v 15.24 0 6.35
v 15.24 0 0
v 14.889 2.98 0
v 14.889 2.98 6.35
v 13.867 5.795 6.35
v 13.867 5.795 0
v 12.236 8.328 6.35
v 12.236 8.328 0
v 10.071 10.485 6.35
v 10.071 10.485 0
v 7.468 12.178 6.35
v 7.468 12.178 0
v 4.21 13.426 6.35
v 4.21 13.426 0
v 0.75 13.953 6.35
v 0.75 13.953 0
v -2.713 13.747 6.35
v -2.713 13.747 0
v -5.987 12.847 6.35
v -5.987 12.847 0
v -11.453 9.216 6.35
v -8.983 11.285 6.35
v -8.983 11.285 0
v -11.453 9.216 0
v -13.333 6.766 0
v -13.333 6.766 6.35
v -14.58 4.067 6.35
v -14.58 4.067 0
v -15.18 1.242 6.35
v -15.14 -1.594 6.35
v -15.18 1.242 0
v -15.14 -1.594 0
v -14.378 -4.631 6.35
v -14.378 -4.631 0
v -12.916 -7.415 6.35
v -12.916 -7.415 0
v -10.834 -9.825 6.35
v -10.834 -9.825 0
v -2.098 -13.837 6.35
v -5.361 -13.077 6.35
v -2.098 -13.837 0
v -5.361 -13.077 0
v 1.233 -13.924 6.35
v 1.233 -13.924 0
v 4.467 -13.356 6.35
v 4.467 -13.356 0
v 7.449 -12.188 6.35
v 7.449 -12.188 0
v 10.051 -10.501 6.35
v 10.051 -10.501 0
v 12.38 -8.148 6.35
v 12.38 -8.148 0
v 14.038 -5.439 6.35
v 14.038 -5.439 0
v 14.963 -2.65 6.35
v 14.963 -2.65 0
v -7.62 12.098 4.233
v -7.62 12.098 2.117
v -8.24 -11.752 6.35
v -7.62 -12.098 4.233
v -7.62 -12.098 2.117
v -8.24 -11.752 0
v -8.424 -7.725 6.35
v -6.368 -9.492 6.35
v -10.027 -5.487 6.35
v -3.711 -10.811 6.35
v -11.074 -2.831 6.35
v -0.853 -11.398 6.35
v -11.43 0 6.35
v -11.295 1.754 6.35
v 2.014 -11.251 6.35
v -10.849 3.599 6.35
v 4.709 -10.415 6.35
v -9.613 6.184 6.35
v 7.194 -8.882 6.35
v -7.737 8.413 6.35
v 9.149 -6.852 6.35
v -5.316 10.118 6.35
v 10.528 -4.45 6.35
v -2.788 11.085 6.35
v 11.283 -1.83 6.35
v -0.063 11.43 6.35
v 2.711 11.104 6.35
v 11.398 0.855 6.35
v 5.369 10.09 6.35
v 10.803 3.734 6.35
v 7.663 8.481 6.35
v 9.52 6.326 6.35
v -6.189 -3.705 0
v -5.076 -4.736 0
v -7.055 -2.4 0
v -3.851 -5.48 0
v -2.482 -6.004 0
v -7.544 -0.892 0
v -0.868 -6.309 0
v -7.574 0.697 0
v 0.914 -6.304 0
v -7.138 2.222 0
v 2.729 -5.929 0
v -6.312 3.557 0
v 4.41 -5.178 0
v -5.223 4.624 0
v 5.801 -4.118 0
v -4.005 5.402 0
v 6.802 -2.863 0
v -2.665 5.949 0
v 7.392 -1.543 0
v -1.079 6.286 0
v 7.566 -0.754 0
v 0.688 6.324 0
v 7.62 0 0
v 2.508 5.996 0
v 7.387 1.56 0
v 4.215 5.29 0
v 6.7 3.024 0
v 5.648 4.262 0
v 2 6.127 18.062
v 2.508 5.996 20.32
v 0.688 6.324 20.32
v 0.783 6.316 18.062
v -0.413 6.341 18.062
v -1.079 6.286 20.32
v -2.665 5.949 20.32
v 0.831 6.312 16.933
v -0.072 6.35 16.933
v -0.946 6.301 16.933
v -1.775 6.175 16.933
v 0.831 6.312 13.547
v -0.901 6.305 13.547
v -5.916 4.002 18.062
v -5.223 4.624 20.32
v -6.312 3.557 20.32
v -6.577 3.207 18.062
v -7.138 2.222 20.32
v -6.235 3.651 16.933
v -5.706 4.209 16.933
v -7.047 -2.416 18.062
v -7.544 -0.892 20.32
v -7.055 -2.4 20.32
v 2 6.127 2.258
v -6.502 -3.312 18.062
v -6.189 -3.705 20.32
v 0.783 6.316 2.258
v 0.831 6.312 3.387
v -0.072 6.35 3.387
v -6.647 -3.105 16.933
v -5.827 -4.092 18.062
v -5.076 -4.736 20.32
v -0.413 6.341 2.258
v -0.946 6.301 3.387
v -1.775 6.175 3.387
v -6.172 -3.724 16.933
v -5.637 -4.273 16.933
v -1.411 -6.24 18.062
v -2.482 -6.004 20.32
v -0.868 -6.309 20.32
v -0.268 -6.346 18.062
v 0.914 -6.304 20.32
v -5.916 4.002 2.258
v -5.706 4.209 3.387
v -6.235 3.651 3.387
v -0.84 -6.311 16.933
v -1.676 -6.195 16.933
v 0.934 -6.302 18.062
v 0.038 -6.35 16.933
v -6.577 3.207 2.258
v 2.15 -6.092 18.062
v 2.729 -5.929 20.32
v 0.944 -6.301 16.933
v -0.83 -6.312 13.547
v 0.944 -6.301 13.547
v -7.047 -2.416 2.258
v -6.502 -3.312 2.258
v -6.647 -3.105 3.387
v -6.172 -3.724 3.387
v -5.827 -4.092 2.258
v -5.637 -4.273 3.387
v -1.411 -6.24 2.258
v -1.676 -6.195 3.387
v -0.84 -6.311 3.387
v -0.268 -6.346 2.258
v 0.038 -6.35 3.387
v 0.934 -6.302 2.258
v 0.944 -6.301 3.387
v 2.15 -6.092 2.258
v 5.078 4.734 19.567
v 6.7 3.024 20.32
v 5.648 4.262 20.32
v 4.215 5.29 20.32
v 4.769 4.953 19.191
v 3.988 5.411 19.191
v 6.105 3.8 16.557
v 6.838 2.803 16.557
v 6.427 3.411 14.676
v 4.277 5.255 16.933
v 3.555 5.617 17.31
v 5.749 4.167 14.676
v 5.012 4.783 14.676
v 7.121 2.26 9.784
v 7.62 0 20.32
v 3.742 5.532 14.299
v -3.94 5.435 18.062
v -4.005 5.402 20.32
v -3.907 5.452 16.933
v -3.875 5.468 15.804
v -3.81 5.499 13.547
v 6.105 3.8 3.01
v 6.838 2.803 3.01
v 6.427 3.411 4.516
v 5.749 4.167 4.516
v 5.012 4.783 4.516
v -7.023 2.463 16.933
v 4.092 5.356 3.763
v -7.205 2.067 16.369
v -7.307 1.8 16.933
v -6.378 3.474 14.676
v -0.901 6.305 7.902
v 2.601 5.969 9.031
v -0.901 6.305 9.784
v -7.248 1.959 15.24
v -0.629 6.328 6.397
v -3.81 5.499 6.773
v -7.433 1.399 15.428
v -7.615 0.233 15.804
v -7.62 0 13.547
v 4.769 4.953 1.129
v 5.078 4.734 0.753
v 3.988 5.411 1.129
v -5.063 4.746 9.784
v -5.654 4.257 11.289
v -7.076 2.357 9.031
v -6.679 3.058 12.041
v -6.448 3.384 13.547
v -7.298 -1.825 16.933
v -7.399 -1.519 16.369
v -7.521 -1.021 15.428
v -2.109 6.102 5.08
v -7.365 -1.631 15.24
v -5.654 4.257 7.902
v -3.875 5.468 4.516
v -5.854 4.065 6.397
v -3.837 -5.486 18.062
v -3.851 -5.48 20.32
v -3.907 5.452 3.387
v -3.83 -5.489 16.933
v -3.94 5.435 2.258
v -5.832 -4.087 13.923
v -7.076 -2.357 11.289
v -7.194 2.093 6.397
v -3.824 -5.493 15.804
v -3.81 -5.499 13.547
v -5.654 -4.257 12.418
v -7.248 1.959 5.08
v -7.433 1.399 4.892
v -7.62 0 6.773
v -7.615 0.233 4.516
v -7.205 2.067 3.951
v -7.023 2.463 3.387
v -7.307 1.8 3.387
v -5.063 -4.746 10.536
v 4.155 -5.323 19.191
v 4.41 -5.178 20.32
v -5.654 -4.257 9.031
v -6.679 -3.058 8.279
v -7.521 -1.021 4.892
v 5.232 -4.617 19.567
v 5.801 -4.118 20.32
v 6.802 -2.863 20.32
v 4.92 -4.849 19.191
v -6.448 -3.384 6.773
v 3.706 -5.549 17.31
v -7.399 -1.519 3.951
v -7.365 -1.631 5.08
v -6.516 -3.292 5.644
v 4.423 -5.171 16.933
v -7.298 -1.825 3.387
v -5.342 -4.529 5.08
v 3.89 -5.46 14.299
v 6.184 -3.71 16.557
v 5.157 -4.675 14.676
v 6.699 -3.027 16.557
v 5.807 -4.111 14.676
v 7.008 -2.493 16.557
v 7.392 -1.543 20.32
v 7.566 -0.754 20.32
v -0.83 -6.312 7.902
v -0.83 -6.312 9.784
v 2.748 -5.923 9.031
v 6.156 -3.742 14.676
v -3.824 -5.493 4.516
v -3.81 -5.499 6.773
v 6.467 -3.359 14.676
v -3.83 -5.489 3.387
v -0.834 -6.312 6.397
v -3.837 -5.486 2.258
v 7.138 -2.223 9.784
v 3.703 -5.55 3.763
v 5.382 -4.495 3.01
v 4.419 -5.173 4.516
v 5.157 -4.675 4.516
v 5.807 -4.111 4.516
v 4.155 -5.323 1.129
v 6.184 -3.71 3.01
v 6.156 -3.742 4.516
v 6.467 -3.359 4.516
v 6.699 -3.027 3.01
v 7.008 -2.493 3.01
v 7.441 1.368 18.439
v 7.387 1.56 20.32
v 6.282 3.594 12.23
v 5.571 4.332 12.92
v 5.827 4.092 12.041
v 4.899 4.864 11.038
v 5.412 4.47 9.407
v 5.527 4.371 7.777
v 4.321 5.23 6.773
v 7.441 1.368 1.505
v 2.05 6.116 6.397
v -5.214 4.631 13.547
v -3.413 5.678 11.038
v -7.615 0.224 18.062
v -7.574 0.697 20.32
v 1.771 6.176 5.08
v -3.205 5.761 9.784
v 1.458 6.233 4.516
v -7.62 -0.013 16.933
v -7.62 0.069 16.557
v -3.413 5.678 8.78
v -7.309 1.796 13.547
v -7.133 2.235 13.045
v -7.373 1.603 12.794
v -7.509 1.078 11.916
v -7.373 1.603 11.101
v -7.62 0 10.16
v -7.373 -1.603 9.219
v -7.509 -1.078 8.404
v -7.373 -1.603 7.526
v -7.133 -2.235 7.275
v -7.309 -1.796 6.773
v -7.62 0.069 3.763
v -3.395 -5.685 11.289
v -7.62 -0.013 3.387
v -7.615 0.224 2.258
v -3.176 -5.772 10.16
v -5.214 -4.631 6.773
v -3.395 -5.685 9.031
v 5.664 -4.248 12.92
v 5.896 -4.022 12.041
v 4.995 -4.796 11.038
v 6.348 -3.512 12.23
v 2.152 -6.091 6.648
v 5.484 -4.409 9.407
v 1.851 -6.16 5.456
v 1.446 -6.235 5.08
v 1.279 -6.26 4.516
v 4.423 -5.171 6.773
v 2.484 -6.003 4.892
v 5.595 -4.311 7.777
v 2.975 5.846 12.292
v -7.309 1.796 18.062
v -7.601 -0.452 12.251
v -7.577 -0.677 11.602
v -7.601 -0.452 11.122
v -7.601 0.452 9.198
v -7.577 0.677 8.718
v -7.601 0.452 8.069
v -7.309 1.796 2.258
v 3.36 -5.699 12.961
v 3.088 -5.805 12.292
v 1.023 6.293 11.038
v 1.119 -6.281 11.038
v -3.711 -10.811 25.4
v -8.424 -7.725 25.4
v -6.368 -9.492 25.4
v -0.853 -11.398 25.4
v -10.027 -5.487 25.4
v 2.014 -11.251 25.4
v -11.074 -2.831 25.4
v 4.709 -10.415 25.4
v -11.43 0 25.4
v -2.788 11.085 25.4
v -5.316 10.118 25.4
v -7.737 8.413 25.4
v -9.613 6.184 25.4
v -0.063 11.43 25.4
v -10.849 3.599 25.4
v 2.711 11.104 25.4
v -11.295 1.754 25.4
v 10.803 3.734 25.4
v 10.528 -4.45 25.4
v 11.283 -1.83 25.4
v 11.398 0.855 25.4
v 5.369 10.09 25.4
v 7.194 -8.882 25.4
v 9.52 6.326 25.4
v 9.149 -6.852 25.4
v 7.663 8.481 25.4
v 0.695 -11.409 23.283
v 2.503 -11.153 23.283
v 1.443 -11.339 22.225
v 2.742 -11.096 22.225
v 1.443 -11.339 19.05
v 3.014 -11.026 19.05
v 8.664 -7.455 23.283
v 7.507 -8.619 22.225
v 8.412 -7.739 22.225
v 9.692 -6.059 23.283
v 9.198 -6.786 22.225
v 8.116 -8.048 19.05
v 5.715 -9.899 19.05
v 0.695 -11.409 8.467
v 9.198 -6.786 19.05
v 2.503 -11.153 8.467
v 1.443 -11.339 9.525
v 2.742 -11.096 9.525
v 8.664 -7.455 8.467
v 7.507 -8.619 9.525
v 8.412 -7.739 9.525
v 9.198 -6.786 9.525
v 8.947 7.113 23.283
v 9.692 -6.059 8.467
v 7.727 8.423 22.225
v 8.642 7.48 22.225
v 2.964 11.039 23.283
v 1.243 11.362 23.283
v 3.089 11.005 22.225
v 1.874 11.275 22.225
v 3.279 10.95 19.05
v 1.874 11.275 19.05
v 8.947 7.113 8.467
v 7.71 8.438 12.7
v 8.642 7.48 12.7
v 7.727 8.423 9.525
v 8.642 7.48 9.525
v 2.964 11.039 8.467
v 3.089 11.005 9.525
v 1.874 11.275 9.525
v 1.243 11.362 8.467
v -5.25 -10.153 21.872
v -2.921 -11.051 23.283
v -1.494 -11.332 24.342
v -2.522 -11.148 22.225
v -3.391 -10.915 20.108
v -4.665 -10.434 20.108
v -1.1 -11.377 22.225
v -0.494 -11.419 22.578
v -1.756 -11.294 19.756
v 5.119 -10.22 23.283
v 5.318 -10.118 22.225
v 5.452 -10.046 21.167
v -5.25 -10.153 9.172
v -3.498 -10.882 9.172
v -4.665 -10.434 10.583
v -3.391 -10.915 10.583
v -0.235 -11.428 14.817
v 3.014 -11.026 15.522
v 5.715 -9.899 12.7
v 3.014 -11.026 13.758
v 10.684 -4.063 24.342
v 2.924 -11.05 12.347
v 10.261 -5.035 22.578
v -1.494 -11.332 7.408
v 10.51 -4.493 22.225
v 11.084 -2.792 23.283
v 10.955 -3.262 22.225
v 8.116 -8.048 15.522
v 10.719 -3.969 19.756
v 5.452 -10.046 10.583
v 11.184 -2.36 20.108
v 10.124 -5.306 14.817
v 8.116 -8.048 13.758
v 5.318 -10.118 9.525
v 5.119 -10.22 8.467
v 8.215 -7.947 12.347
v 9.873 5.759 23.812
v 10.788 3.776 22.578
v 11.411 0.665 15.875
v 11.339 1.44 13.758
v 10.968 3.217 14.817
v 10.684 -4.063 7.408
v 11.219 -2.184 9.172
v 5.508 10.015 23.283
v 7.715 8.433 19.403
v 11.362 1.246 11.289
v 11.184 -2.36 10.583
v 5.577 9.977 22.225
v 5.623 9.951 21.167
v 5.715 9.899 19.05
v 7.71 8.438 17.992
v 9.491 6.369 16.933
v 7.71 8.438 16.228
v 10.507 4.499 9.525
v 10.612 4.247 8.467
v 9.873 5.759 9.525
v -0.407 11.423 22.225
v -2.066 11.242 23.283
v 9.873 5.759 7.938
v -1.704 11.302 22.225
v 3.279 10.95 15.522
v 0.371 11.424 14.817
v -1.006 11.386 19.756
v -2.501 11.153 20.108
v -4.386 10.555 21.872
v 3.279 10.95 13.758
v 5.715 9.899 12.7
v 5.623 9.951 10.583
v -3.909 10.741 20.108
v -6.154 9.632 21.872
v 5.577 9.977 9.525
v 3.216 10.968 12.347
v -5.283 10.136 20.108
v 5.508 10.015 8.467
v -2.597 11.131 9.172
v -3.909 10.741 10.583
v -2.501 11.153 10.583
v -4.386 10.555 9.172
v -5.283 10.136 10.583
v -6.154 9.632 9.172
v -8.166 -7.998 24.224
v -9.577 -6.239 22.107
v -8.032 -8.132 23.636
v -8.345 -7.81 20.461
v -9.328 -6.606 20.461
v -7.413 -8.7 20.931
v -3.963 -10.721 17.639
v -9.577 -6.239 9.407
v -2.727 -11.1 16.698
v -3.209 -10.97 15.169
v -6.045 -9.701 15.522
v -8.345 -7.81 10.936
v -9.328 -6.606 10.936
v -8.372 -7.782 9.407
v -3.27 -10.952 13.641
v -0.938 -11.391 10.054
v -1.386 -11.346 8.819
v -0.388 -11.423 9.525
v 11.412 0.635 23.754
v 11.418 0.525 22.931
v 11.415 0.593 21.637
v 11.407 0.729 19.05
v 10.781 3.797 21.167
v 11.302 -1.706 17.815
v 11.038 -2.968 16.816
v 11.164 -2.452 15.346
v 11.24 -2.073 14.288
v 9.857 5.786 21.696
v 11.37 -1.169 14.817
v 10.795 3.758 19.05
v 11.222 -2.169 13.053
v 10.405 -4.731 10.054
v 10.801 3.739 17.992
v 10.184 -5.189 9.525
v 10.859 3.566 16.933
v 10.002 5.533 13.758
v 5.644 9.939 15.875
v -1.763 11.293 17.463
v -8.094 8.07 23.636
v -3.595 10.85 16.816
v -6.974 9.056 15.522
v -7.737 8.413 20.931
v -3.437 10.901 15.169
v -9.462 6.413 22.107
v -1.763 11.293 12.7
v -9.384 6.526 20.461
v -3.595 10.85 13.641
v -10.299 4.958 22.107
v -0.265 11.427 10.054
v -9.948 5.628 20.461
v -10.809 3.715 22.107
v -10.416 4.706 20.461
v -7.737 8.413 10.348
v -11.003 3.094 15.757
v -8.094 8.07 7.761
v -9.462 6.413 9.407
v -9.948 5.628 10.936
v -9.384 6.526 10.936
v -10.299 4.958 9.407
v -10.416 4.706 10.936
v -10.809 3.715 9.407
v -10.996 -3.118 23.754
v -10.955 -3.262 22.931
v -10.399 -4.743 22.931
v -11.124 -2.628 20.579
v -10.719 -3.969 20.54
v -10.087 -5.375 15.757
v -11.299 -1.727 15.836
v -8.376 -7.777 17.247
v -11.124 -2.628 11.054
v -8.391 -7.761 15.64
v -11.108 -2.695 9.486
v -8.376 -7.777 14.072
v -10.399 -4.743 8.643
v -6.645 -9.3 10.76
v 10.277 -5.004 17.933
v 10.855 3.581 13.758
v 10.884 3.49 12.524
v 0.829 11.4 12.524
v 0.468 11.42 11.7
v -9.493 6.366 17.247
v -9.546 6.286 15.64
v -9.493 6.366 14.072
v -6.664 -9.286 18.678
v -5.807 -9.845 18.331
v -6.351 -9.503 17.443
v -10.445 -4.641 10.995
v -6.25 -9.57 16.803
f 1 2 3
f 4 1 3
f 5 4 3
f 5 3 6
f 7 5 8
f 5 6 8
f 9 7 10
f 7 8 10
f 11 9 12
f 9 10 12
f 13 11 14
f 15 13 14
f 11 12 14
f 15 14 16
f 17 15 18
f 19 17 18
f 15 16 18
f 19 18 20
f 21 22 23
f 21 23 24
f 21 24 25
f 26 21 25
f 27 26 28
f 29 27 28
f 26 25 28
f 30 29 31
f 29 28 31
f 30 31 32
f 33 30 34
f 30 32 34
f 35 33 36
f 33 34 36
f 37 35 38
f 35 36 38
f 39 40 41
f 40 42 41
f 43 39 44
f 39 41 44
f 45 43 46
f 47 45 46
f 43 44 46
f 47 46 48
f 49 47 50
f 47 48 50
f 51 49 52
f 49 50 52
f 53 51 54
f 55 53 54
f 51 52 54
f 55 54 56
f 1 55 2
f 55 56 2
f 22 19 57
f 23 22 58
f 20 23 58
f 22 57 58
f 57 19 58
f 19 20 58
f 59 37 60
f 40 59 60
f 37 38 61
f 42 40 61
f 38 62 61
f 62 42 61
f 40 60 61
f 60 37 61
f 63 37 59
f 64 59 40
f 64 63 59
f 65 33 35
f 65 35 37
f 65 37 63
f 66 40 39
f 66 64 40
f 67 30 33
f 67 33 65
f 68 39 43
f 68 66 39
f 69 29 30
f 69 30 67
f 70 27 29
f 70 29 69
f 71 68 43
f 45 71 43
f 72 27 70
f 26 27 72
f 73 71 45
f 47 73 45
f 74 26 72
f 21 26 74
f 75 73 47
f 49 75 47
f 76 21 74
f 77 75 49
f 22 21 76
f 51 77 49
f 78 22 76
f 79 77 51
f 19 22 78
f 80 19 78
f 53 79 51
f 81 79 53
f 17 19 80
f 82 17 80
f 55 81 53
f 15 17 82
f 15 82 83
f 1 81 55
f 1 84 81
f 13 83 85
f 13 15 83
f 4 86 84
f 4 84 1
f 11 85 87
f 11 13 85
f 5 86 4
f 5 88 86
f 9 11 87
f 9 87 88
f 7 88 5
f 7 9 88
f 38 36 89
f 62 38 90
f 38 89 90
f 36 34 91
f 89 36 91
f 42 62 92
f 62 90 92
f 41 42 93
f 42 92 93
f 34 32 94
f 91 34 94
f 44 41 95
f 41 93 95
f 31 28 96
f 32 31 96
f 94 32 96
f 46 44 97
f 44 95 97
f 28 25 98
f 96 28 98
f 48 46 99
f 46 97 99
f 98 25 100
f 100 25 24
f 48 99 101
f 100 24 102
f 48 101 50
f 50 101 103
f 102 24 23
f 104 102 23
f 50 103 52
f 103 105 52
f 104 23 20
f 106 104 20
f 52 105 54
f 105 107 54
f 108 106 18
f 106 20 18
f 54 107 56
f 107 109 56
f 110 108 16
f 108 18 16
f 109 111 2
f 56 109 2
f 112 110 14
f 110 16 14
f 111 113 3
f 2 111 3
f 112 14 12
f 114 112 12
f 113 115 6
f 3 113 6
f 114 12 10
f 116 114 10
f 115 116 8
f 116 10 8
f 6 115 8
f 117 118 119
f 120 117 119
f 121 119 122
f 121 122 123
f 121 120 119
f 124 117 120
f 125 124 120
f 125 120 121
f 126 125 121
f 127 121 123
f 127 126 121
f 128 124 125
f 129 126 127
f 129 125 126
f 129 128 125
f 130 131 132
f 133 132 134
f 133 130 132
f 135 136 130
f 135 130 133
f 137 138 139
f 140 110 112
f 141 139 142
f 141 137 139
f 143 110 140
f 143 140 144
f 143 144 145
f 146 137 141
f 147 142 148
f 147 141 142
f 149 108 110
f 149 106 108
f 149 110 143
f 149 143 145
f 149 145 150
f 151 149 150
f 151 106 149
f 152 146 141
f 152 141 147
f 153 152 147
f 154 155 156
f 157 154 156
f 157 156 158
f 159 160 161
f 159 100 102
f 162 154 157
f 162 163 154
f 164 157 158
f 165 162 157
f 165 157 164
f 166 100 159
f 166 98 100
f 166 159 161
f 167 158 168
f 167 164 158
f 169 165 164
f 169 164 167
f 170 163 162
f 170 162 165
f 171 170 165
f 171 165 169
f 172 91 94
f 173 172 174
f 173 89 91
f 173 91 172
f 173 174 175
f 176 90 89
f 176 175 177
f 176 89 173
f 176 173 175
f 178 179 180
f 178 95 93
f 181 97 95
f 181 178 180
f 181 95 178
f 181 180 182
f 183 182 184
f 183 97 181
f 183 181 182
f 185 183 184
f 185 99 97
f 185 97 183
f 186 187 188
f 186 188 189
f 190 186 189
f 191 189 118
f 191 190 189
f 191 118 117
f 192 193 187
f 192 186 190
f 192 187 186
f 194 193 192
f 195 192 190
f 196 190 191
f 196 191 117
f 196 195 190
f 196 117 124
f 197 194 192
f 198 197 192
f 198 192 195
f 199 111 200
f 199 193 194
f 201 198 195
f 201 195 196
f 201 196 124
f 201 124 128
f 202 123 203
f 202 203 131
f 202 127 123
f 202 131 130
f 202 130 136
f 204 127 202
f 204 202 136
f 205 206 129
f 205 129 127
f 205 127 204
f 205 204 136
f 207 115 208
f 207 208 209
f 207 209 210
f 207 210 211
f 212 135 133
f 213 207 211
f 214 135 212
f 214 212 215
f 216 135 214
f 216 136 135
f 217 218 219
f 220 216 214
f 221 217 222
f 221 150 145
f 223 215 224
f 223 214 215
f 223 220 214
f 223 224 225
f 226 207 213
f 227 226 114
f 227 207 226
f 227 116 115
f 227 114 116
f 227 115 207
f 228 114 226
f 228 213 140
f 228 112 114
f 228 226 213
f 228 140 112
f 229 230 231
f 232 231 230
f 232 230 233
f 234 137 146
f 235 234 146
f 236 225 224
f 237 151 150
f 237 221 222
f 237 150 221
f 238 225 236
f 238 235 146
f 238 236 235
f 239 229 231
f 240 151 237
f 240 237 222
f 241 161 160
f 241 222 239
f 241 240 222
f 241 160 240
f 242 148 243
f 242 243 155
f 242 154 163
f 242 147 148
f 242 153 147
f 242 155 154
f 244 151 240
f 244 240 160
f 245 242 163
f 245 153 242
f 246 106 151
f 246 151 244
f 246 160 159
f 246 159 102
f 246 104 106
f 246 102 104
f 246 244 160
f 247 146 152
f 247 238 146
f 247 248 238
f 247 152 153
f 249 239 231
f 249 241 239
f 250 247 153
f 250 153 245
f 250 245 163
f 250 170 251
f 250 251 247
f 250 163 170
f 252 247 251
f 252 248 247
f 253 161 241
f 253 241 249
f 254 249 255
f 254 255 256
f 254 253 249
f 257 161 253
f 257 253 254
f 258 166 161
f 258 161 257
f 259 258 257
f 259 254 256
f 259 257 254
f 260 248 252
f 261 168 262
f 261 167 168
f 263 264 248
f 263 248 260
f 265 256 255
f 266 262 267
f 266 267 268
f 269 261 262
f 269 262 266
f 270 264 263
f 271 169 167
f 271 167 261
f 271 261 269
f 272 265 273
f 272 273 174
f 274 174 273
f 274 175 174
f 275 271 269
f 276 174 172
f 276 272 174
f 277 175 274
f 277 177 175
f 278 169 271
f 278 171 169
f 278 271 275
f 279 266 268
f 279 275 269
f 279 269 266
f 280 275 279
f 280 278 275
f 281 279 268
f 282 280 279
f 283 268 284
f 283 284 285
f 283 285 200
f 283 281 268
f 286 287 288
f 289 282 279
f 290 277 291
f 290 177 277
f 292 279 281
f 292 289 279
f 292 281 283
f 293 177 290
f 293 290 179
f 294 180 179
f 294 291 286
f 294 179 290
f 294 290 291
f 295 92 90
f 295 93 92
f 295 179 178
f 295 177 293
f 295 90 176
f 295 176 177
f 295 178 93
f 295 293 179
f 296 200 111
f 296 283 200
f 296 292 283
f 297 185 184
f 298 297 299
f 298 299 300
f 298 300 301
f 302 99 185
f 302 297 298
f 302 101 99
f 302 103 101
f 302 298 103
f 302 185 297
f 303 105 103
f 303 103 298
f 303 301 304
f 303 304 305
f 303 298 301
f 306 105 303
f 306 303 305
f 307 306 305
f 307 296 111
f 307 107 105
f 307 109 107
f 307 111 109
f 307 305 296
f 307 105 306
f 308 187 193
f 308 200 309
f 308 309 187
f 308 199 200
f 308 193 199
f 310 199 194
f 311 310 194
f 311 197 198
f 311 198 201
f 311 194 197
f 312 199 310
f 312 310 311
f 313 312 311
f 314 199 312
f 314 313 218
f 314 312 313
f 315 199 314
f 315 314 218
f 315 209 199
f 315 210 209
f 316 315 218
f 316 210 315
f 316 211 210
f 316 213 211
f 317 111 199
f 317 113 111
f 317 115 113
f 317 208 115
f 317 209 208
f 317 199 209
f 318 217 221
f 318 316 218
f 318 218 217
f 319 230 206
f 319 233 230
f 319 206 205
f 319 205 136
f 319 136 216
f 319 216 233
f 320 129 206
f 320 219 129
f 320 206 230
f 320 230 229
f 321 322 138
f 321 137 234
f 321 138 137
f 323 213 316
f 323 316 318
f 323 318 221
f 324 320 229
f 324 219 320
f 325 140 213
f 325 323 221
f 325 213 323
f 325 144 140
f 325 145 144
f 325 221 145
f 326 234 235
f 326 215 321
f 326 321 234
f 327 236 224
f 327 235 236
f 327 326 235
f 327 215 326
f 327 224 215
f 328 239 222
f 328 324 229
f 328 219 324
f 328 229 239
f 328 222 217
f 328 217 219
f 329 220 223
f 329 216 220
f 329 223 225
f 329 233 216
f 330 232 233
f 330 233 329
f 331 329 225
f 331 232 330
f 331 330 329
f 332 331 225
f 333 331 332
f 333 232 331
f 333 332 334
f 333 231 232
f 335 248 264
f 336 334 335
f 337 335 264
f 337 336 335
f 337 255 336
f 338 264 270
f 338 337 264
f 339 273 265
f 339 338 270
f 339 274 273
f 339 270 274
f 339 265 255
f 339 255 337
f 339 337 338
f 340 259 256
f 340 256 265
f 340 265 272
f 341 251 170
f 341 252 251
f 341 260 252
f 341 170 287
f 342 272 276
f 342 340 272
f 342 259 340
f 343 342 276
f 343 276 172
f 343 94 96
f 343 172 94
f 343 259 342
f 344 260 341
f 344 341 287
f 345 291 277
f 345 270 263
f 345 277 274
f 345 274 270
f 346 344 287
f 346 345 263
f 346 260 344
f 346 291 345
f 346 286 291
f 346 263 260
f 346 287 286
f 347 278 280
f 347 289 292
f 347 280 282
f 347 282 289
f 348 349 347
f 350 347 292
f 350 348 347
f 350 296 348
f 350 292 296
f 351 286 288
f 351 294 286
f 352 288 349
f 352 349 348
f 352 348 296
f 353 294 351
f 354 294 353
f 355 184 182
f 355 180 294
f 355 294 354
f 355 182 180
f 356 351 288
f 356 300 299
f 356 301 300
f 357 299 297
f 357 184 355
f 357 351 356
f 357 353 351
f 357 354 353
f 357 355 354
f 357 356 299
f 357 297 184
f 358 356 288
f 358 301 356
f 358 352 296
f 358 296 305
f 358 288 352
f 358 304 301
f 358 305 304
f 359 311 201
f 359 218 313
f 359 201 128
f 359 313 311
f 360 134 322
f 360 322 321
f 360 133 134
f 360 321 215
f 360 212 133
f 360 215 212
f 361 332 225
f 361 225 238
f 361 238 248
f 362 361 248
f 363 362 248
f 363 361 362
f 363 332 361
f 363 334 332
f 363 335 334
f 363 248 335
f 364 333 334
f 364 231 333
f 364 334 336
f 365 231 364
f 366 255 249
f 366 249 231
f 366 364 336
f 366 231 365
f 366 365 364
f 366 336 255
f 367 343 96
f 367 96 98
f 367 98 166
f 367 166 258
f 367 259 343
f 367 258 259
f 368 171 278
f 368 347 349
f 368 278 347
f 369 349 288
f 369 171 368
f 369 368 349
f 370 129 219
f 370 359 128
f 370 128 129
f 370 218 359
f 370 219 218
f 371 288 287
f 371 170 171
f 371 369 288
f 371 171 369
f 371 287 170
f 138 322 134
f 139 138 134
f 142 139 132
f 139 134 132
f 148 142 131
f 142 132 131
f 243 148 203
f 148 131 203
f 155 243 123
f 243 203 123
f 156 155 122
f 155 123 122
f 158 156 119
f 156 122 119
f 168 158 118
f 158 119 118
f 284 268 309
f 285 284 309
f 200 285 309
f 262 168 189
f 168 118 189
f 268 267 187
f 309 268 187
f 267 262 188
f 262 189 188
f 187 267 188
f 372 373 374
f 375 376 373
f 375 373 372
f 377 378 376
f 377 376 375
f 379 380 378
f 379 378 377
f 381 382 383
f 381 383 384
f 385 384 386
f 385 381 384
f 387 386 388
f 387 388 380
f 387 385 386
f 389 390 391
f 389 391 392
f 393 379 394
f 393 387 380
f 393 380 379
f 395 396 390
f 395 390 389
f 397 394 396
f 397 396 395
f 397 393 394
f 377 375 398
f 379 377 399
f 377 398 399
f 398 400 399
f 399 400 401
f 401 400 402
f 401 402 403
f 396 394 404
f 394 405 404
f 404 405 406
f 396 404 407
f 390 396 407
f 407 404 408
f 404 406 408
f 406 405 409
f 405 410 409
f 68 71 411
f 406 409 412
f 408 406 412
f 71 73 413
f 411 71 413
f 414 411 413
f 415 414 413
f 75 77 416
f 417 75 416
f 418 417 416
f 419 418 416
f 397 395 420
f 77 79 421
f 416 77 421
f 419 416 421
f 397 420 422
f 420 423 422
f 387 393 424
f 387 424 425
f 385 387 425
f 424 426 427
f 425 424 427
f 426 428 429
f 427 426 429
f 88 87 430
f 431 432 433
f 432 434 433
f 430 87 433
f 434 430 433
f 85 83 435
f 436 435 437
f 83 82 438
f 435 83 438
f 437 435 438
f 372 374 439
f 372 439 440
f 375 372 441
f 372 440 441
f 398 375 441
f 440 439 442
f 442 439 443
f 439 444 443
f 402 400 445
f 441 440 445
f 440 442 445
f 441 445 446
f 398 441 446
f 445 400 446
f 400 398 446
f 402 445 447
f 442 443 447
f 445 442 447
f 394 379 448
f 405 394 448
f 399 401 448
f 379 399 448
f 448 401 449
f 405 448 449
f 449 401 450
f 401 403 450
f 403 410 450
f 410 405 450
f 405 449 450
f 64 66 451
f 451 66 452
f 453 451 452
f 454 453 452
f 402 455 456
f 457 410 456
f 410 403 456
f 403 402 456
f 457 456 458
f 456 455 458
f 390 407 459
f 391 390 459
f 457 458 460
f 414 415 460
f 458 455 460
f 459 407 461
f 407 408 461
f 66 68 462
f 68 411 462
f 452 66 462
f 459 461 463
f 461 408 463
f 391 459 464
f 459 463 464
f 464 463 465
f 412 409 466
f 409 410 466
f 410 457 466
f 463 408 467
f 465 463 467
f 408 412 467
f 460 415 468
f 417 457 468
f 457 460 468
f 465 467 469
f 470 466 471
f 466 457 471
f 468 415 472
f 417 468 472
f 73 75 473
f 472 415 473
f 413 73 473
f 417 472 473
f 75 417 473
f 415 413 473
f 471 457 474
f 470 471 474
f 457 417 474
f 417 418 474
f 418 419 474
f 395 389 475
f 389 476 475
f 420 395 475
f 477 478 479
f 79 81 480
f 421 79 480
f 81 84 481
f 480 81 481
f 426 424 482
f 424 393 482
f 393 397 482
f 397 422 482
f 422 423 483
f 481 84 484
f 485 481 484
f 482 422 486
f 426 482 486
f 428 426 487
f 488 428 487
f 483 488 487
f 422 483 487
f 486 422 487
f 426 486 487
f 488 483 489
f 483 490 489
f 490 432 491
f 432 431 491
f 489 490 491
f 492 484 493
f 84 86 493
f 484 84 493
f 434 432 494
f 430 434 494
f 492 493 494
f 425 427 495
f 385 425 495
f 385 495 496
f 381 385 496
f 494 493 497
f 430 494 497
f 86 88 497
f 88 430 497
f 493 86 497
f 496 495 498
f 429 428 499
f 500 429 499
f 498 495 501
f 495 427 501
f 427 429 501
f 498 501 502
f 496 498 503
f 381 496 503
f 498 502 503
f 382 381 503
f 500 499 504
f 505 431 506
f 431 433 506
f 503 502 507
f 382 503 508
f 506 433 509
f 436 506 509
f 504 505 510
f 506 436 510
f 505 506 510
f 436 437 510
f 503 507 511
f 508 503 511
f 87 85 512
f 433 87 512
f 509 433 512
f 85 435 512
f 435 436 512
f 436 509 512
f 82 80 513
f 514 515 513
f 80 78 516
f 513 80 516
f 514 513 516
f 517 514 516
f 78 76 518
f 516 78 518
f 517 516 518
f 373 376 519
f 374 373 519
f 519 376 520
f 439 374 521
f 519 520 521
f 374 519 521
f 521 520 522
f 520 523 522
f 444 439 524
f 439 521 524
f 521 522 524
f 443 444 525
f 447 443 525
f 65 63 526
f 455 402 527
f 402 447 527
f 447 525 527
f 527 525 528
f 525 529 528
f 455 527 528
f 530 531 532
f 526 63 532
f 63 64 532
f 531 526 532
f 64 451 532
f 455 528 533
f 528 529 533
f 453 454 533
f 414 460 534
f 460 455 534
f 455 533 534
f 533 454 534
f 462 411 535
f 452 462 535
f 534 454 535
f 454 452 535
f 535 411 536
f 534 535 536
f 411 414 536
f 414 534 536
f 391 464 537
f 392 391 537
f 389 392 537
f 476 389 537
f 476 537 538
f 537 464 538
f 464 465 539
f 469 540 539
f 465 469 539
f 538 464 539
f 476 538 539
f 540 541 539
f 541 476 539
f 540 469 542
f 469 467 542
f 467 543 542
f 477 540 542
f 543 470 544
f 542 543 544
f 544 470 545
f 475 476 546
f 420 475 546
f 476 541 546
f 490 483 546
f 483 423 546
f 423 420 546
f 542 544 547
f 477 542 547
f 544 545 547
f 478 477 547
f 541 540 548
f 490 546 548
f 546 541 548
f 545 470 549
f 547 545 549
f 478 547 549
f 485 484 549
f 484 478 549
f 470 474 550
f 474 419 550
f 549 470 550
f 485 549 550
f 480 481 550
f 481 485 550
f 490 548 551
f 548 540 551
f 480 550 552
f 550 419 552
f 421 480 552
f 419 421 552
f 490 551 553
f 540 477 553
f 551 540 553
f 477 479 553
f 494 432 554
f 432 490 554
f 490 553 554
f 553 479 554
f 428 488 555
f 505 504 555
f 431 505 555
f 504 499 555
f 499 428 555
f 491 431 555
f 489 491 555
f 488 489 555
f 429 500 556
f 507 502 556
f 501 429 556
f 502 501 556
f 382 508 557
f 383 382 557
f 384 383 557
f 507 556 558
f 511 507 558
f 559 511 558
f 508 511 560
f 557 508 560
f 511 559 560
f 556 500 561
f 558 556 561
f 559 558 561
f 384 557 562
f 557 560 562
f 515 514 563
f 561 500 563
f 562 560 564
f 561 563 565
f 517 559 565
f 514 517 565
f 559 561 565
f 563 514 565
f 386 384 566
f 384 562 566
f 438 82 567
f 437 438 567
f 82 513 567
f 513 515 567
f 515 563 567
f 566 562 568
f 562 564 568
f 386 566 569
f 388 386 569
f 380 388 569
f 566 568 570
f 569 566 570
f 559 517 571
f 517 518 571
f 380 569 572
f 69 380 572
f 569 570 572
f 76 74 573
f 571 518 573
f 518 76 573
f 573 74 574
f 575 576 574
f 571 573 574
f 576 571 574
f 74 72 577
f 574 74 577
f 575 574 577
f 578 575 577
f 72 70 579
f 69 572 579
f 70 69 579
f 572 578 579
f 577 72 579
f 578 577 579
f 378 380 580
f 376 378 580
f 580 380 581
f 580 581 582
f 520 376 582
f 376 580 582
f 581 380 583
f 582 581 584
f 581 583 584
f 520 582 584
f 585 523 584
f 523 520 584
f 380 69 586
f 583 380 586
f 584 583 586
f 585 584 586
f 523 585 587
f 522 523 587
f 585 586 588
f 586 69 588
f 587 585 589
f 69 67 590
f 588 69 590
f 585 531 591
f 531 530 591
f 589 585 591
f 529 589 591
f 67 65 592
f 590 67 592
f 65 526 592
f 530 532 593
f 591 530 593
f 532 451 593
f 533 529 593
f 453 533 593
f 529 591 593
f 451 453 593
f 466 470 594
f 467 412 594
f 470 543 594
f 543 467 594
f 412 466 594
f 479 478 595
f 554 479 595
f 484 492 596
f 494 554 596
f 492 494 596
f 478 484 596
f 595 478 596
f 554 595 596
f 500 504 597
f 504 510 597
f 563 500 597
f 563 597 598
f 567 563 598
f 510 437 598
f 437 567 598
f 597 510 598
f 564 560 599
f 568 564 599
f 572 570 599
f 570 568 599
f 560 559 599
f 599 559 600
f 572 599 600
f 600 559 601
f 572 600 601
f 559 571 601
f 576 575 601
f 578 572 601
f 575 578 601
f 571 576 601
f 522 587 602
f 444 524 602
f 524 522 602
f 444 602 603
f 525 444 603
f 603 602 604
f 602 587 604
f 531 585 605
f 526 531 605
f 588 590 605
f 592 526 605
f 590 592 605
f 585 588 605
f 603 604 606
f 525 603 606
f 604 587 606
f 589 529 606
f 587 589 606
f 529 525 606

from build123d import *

# Parameters (mm, degrees)
F1_DEPTH = 25.4
F2_DEPTH = 6.35
F3_DEPTH = 20.32


with BuildPart() as f1:
    # F0 (on Top) → F1 (new body)
    with BuildSketch(Plane.XY):
        with BuildLine():
            add(Edge.make_bspline(
                [(-11.43, 0), (-11.43, -19.797341), (5.715, -9.89867), (22.86, 0), (5.715, 9.89867), (-11.43, 19.797341), (-11.43, 0)],
                knots=[0, 0, 0, 2.094395, 2.094395, 4.18879, 4.18879, 6.283185, 6.283185, 6.283185], degree=2, weights=[1, 0.5, 1, 0.5, 1, 0.5, 1]))
        make_face()
        with BuildLine():
            add(Edge.make_bspline(
                [(7.62, 0), (7.62, 10.998523), (-3.81, 5.499261), (-15.24, 0), (-3.81, -5.499261), (7.62, -10.998523), (7.62, 0)],
                knots=[0, 0, 0, 2.094395, 2.094395, 4.18879, 4.18879, 6.283185, 6.283185, 6.283185], degree=2, weights=[1, 0.5, 1, 0.5, 1, 0.5, 1]))
        make_face(mode=Mode.SUBTRACT)
        with BuildLine():
            add(Edge.make_bspline(
                [(7.62, 0), (7.62, 10.998523), (-3.81, 5.499261), (-15.24, 0), (-3.81, -5.499261), (7.62, -10.998523), (7.62, 0)],
                knots=[0, 0, 0, 2.094395, 2.094395, 4.18879, 4.18879, 6.283185, 6.283185, 6.283185], degree=2, weights=[1, 0.5, 1, 0.5, 1, 0.5, 1]))
        make_face()
    extrude(amount=F1_DEPTH)

    # F0 (on Top) → F2 (join)
    with BuildSketch(Plane.XY):
        with BuildLine():
            add(Edge.make_bspline(
                [(15.24, 0), (15.24, 24.19675), (-7.62, 12.098375), (-30.48, 0), (-7.62, -12.098375), (15.24, -24.19675), (15.24, 0)],
                knots=[0, 0, 0, 2.094395, 2.094395, 4.18879, 4.18879, 6.283185, 6.283185, 6.283185], degree=2, weights=[1, 0.5, 1, 0.5, 1, 0.5, 1]))
        make_face()
        with BuildLine():
            add(Edge.make_bspline(
                [(-11.43, 0), (-11.43, -19.797341), (5.715, -9.89867), (22.86, 0), (5.715, 9.89867), (-11.43, 19.797341), (-11.43, 0)],
                knots=[0, 0, 0, 2.094395, 2.094395, 4.18879, 4.18879, 6.283185, 6.283185, 6.283185], degree=2, weights=[1, 0.5, 1, 0.5, 1, 0.5, 1]))
        make_face(mode=Mode.SUBTRACT)
    extrude(amount=F2_DEPTH)

    # F0 (on Top) → F3 (cut)
    with BuildSketch(Plane.XY):
        with BuildLine():
            add(Edge.make_bspline(
                [(7.62, 0), (7.62, 10.998523), (-3.81, 5.499261), (-15.24, 0), (-3.81, -5.499261), (7.62, -10.998523), (7.62, 0)],
                knots=[0, 0, 0, 2.094395, 2.094395, 4.18879, 4.18879, 6.283185, 6.283185, 6.283185], degree=2, weights=[1, 0.5, 1, 0.5, 1, 0.5, 1]))
        make_face()
    extrude(amount=F3_DEPTH, mode=Mode.SUBTRACT)


solid = f1.part
